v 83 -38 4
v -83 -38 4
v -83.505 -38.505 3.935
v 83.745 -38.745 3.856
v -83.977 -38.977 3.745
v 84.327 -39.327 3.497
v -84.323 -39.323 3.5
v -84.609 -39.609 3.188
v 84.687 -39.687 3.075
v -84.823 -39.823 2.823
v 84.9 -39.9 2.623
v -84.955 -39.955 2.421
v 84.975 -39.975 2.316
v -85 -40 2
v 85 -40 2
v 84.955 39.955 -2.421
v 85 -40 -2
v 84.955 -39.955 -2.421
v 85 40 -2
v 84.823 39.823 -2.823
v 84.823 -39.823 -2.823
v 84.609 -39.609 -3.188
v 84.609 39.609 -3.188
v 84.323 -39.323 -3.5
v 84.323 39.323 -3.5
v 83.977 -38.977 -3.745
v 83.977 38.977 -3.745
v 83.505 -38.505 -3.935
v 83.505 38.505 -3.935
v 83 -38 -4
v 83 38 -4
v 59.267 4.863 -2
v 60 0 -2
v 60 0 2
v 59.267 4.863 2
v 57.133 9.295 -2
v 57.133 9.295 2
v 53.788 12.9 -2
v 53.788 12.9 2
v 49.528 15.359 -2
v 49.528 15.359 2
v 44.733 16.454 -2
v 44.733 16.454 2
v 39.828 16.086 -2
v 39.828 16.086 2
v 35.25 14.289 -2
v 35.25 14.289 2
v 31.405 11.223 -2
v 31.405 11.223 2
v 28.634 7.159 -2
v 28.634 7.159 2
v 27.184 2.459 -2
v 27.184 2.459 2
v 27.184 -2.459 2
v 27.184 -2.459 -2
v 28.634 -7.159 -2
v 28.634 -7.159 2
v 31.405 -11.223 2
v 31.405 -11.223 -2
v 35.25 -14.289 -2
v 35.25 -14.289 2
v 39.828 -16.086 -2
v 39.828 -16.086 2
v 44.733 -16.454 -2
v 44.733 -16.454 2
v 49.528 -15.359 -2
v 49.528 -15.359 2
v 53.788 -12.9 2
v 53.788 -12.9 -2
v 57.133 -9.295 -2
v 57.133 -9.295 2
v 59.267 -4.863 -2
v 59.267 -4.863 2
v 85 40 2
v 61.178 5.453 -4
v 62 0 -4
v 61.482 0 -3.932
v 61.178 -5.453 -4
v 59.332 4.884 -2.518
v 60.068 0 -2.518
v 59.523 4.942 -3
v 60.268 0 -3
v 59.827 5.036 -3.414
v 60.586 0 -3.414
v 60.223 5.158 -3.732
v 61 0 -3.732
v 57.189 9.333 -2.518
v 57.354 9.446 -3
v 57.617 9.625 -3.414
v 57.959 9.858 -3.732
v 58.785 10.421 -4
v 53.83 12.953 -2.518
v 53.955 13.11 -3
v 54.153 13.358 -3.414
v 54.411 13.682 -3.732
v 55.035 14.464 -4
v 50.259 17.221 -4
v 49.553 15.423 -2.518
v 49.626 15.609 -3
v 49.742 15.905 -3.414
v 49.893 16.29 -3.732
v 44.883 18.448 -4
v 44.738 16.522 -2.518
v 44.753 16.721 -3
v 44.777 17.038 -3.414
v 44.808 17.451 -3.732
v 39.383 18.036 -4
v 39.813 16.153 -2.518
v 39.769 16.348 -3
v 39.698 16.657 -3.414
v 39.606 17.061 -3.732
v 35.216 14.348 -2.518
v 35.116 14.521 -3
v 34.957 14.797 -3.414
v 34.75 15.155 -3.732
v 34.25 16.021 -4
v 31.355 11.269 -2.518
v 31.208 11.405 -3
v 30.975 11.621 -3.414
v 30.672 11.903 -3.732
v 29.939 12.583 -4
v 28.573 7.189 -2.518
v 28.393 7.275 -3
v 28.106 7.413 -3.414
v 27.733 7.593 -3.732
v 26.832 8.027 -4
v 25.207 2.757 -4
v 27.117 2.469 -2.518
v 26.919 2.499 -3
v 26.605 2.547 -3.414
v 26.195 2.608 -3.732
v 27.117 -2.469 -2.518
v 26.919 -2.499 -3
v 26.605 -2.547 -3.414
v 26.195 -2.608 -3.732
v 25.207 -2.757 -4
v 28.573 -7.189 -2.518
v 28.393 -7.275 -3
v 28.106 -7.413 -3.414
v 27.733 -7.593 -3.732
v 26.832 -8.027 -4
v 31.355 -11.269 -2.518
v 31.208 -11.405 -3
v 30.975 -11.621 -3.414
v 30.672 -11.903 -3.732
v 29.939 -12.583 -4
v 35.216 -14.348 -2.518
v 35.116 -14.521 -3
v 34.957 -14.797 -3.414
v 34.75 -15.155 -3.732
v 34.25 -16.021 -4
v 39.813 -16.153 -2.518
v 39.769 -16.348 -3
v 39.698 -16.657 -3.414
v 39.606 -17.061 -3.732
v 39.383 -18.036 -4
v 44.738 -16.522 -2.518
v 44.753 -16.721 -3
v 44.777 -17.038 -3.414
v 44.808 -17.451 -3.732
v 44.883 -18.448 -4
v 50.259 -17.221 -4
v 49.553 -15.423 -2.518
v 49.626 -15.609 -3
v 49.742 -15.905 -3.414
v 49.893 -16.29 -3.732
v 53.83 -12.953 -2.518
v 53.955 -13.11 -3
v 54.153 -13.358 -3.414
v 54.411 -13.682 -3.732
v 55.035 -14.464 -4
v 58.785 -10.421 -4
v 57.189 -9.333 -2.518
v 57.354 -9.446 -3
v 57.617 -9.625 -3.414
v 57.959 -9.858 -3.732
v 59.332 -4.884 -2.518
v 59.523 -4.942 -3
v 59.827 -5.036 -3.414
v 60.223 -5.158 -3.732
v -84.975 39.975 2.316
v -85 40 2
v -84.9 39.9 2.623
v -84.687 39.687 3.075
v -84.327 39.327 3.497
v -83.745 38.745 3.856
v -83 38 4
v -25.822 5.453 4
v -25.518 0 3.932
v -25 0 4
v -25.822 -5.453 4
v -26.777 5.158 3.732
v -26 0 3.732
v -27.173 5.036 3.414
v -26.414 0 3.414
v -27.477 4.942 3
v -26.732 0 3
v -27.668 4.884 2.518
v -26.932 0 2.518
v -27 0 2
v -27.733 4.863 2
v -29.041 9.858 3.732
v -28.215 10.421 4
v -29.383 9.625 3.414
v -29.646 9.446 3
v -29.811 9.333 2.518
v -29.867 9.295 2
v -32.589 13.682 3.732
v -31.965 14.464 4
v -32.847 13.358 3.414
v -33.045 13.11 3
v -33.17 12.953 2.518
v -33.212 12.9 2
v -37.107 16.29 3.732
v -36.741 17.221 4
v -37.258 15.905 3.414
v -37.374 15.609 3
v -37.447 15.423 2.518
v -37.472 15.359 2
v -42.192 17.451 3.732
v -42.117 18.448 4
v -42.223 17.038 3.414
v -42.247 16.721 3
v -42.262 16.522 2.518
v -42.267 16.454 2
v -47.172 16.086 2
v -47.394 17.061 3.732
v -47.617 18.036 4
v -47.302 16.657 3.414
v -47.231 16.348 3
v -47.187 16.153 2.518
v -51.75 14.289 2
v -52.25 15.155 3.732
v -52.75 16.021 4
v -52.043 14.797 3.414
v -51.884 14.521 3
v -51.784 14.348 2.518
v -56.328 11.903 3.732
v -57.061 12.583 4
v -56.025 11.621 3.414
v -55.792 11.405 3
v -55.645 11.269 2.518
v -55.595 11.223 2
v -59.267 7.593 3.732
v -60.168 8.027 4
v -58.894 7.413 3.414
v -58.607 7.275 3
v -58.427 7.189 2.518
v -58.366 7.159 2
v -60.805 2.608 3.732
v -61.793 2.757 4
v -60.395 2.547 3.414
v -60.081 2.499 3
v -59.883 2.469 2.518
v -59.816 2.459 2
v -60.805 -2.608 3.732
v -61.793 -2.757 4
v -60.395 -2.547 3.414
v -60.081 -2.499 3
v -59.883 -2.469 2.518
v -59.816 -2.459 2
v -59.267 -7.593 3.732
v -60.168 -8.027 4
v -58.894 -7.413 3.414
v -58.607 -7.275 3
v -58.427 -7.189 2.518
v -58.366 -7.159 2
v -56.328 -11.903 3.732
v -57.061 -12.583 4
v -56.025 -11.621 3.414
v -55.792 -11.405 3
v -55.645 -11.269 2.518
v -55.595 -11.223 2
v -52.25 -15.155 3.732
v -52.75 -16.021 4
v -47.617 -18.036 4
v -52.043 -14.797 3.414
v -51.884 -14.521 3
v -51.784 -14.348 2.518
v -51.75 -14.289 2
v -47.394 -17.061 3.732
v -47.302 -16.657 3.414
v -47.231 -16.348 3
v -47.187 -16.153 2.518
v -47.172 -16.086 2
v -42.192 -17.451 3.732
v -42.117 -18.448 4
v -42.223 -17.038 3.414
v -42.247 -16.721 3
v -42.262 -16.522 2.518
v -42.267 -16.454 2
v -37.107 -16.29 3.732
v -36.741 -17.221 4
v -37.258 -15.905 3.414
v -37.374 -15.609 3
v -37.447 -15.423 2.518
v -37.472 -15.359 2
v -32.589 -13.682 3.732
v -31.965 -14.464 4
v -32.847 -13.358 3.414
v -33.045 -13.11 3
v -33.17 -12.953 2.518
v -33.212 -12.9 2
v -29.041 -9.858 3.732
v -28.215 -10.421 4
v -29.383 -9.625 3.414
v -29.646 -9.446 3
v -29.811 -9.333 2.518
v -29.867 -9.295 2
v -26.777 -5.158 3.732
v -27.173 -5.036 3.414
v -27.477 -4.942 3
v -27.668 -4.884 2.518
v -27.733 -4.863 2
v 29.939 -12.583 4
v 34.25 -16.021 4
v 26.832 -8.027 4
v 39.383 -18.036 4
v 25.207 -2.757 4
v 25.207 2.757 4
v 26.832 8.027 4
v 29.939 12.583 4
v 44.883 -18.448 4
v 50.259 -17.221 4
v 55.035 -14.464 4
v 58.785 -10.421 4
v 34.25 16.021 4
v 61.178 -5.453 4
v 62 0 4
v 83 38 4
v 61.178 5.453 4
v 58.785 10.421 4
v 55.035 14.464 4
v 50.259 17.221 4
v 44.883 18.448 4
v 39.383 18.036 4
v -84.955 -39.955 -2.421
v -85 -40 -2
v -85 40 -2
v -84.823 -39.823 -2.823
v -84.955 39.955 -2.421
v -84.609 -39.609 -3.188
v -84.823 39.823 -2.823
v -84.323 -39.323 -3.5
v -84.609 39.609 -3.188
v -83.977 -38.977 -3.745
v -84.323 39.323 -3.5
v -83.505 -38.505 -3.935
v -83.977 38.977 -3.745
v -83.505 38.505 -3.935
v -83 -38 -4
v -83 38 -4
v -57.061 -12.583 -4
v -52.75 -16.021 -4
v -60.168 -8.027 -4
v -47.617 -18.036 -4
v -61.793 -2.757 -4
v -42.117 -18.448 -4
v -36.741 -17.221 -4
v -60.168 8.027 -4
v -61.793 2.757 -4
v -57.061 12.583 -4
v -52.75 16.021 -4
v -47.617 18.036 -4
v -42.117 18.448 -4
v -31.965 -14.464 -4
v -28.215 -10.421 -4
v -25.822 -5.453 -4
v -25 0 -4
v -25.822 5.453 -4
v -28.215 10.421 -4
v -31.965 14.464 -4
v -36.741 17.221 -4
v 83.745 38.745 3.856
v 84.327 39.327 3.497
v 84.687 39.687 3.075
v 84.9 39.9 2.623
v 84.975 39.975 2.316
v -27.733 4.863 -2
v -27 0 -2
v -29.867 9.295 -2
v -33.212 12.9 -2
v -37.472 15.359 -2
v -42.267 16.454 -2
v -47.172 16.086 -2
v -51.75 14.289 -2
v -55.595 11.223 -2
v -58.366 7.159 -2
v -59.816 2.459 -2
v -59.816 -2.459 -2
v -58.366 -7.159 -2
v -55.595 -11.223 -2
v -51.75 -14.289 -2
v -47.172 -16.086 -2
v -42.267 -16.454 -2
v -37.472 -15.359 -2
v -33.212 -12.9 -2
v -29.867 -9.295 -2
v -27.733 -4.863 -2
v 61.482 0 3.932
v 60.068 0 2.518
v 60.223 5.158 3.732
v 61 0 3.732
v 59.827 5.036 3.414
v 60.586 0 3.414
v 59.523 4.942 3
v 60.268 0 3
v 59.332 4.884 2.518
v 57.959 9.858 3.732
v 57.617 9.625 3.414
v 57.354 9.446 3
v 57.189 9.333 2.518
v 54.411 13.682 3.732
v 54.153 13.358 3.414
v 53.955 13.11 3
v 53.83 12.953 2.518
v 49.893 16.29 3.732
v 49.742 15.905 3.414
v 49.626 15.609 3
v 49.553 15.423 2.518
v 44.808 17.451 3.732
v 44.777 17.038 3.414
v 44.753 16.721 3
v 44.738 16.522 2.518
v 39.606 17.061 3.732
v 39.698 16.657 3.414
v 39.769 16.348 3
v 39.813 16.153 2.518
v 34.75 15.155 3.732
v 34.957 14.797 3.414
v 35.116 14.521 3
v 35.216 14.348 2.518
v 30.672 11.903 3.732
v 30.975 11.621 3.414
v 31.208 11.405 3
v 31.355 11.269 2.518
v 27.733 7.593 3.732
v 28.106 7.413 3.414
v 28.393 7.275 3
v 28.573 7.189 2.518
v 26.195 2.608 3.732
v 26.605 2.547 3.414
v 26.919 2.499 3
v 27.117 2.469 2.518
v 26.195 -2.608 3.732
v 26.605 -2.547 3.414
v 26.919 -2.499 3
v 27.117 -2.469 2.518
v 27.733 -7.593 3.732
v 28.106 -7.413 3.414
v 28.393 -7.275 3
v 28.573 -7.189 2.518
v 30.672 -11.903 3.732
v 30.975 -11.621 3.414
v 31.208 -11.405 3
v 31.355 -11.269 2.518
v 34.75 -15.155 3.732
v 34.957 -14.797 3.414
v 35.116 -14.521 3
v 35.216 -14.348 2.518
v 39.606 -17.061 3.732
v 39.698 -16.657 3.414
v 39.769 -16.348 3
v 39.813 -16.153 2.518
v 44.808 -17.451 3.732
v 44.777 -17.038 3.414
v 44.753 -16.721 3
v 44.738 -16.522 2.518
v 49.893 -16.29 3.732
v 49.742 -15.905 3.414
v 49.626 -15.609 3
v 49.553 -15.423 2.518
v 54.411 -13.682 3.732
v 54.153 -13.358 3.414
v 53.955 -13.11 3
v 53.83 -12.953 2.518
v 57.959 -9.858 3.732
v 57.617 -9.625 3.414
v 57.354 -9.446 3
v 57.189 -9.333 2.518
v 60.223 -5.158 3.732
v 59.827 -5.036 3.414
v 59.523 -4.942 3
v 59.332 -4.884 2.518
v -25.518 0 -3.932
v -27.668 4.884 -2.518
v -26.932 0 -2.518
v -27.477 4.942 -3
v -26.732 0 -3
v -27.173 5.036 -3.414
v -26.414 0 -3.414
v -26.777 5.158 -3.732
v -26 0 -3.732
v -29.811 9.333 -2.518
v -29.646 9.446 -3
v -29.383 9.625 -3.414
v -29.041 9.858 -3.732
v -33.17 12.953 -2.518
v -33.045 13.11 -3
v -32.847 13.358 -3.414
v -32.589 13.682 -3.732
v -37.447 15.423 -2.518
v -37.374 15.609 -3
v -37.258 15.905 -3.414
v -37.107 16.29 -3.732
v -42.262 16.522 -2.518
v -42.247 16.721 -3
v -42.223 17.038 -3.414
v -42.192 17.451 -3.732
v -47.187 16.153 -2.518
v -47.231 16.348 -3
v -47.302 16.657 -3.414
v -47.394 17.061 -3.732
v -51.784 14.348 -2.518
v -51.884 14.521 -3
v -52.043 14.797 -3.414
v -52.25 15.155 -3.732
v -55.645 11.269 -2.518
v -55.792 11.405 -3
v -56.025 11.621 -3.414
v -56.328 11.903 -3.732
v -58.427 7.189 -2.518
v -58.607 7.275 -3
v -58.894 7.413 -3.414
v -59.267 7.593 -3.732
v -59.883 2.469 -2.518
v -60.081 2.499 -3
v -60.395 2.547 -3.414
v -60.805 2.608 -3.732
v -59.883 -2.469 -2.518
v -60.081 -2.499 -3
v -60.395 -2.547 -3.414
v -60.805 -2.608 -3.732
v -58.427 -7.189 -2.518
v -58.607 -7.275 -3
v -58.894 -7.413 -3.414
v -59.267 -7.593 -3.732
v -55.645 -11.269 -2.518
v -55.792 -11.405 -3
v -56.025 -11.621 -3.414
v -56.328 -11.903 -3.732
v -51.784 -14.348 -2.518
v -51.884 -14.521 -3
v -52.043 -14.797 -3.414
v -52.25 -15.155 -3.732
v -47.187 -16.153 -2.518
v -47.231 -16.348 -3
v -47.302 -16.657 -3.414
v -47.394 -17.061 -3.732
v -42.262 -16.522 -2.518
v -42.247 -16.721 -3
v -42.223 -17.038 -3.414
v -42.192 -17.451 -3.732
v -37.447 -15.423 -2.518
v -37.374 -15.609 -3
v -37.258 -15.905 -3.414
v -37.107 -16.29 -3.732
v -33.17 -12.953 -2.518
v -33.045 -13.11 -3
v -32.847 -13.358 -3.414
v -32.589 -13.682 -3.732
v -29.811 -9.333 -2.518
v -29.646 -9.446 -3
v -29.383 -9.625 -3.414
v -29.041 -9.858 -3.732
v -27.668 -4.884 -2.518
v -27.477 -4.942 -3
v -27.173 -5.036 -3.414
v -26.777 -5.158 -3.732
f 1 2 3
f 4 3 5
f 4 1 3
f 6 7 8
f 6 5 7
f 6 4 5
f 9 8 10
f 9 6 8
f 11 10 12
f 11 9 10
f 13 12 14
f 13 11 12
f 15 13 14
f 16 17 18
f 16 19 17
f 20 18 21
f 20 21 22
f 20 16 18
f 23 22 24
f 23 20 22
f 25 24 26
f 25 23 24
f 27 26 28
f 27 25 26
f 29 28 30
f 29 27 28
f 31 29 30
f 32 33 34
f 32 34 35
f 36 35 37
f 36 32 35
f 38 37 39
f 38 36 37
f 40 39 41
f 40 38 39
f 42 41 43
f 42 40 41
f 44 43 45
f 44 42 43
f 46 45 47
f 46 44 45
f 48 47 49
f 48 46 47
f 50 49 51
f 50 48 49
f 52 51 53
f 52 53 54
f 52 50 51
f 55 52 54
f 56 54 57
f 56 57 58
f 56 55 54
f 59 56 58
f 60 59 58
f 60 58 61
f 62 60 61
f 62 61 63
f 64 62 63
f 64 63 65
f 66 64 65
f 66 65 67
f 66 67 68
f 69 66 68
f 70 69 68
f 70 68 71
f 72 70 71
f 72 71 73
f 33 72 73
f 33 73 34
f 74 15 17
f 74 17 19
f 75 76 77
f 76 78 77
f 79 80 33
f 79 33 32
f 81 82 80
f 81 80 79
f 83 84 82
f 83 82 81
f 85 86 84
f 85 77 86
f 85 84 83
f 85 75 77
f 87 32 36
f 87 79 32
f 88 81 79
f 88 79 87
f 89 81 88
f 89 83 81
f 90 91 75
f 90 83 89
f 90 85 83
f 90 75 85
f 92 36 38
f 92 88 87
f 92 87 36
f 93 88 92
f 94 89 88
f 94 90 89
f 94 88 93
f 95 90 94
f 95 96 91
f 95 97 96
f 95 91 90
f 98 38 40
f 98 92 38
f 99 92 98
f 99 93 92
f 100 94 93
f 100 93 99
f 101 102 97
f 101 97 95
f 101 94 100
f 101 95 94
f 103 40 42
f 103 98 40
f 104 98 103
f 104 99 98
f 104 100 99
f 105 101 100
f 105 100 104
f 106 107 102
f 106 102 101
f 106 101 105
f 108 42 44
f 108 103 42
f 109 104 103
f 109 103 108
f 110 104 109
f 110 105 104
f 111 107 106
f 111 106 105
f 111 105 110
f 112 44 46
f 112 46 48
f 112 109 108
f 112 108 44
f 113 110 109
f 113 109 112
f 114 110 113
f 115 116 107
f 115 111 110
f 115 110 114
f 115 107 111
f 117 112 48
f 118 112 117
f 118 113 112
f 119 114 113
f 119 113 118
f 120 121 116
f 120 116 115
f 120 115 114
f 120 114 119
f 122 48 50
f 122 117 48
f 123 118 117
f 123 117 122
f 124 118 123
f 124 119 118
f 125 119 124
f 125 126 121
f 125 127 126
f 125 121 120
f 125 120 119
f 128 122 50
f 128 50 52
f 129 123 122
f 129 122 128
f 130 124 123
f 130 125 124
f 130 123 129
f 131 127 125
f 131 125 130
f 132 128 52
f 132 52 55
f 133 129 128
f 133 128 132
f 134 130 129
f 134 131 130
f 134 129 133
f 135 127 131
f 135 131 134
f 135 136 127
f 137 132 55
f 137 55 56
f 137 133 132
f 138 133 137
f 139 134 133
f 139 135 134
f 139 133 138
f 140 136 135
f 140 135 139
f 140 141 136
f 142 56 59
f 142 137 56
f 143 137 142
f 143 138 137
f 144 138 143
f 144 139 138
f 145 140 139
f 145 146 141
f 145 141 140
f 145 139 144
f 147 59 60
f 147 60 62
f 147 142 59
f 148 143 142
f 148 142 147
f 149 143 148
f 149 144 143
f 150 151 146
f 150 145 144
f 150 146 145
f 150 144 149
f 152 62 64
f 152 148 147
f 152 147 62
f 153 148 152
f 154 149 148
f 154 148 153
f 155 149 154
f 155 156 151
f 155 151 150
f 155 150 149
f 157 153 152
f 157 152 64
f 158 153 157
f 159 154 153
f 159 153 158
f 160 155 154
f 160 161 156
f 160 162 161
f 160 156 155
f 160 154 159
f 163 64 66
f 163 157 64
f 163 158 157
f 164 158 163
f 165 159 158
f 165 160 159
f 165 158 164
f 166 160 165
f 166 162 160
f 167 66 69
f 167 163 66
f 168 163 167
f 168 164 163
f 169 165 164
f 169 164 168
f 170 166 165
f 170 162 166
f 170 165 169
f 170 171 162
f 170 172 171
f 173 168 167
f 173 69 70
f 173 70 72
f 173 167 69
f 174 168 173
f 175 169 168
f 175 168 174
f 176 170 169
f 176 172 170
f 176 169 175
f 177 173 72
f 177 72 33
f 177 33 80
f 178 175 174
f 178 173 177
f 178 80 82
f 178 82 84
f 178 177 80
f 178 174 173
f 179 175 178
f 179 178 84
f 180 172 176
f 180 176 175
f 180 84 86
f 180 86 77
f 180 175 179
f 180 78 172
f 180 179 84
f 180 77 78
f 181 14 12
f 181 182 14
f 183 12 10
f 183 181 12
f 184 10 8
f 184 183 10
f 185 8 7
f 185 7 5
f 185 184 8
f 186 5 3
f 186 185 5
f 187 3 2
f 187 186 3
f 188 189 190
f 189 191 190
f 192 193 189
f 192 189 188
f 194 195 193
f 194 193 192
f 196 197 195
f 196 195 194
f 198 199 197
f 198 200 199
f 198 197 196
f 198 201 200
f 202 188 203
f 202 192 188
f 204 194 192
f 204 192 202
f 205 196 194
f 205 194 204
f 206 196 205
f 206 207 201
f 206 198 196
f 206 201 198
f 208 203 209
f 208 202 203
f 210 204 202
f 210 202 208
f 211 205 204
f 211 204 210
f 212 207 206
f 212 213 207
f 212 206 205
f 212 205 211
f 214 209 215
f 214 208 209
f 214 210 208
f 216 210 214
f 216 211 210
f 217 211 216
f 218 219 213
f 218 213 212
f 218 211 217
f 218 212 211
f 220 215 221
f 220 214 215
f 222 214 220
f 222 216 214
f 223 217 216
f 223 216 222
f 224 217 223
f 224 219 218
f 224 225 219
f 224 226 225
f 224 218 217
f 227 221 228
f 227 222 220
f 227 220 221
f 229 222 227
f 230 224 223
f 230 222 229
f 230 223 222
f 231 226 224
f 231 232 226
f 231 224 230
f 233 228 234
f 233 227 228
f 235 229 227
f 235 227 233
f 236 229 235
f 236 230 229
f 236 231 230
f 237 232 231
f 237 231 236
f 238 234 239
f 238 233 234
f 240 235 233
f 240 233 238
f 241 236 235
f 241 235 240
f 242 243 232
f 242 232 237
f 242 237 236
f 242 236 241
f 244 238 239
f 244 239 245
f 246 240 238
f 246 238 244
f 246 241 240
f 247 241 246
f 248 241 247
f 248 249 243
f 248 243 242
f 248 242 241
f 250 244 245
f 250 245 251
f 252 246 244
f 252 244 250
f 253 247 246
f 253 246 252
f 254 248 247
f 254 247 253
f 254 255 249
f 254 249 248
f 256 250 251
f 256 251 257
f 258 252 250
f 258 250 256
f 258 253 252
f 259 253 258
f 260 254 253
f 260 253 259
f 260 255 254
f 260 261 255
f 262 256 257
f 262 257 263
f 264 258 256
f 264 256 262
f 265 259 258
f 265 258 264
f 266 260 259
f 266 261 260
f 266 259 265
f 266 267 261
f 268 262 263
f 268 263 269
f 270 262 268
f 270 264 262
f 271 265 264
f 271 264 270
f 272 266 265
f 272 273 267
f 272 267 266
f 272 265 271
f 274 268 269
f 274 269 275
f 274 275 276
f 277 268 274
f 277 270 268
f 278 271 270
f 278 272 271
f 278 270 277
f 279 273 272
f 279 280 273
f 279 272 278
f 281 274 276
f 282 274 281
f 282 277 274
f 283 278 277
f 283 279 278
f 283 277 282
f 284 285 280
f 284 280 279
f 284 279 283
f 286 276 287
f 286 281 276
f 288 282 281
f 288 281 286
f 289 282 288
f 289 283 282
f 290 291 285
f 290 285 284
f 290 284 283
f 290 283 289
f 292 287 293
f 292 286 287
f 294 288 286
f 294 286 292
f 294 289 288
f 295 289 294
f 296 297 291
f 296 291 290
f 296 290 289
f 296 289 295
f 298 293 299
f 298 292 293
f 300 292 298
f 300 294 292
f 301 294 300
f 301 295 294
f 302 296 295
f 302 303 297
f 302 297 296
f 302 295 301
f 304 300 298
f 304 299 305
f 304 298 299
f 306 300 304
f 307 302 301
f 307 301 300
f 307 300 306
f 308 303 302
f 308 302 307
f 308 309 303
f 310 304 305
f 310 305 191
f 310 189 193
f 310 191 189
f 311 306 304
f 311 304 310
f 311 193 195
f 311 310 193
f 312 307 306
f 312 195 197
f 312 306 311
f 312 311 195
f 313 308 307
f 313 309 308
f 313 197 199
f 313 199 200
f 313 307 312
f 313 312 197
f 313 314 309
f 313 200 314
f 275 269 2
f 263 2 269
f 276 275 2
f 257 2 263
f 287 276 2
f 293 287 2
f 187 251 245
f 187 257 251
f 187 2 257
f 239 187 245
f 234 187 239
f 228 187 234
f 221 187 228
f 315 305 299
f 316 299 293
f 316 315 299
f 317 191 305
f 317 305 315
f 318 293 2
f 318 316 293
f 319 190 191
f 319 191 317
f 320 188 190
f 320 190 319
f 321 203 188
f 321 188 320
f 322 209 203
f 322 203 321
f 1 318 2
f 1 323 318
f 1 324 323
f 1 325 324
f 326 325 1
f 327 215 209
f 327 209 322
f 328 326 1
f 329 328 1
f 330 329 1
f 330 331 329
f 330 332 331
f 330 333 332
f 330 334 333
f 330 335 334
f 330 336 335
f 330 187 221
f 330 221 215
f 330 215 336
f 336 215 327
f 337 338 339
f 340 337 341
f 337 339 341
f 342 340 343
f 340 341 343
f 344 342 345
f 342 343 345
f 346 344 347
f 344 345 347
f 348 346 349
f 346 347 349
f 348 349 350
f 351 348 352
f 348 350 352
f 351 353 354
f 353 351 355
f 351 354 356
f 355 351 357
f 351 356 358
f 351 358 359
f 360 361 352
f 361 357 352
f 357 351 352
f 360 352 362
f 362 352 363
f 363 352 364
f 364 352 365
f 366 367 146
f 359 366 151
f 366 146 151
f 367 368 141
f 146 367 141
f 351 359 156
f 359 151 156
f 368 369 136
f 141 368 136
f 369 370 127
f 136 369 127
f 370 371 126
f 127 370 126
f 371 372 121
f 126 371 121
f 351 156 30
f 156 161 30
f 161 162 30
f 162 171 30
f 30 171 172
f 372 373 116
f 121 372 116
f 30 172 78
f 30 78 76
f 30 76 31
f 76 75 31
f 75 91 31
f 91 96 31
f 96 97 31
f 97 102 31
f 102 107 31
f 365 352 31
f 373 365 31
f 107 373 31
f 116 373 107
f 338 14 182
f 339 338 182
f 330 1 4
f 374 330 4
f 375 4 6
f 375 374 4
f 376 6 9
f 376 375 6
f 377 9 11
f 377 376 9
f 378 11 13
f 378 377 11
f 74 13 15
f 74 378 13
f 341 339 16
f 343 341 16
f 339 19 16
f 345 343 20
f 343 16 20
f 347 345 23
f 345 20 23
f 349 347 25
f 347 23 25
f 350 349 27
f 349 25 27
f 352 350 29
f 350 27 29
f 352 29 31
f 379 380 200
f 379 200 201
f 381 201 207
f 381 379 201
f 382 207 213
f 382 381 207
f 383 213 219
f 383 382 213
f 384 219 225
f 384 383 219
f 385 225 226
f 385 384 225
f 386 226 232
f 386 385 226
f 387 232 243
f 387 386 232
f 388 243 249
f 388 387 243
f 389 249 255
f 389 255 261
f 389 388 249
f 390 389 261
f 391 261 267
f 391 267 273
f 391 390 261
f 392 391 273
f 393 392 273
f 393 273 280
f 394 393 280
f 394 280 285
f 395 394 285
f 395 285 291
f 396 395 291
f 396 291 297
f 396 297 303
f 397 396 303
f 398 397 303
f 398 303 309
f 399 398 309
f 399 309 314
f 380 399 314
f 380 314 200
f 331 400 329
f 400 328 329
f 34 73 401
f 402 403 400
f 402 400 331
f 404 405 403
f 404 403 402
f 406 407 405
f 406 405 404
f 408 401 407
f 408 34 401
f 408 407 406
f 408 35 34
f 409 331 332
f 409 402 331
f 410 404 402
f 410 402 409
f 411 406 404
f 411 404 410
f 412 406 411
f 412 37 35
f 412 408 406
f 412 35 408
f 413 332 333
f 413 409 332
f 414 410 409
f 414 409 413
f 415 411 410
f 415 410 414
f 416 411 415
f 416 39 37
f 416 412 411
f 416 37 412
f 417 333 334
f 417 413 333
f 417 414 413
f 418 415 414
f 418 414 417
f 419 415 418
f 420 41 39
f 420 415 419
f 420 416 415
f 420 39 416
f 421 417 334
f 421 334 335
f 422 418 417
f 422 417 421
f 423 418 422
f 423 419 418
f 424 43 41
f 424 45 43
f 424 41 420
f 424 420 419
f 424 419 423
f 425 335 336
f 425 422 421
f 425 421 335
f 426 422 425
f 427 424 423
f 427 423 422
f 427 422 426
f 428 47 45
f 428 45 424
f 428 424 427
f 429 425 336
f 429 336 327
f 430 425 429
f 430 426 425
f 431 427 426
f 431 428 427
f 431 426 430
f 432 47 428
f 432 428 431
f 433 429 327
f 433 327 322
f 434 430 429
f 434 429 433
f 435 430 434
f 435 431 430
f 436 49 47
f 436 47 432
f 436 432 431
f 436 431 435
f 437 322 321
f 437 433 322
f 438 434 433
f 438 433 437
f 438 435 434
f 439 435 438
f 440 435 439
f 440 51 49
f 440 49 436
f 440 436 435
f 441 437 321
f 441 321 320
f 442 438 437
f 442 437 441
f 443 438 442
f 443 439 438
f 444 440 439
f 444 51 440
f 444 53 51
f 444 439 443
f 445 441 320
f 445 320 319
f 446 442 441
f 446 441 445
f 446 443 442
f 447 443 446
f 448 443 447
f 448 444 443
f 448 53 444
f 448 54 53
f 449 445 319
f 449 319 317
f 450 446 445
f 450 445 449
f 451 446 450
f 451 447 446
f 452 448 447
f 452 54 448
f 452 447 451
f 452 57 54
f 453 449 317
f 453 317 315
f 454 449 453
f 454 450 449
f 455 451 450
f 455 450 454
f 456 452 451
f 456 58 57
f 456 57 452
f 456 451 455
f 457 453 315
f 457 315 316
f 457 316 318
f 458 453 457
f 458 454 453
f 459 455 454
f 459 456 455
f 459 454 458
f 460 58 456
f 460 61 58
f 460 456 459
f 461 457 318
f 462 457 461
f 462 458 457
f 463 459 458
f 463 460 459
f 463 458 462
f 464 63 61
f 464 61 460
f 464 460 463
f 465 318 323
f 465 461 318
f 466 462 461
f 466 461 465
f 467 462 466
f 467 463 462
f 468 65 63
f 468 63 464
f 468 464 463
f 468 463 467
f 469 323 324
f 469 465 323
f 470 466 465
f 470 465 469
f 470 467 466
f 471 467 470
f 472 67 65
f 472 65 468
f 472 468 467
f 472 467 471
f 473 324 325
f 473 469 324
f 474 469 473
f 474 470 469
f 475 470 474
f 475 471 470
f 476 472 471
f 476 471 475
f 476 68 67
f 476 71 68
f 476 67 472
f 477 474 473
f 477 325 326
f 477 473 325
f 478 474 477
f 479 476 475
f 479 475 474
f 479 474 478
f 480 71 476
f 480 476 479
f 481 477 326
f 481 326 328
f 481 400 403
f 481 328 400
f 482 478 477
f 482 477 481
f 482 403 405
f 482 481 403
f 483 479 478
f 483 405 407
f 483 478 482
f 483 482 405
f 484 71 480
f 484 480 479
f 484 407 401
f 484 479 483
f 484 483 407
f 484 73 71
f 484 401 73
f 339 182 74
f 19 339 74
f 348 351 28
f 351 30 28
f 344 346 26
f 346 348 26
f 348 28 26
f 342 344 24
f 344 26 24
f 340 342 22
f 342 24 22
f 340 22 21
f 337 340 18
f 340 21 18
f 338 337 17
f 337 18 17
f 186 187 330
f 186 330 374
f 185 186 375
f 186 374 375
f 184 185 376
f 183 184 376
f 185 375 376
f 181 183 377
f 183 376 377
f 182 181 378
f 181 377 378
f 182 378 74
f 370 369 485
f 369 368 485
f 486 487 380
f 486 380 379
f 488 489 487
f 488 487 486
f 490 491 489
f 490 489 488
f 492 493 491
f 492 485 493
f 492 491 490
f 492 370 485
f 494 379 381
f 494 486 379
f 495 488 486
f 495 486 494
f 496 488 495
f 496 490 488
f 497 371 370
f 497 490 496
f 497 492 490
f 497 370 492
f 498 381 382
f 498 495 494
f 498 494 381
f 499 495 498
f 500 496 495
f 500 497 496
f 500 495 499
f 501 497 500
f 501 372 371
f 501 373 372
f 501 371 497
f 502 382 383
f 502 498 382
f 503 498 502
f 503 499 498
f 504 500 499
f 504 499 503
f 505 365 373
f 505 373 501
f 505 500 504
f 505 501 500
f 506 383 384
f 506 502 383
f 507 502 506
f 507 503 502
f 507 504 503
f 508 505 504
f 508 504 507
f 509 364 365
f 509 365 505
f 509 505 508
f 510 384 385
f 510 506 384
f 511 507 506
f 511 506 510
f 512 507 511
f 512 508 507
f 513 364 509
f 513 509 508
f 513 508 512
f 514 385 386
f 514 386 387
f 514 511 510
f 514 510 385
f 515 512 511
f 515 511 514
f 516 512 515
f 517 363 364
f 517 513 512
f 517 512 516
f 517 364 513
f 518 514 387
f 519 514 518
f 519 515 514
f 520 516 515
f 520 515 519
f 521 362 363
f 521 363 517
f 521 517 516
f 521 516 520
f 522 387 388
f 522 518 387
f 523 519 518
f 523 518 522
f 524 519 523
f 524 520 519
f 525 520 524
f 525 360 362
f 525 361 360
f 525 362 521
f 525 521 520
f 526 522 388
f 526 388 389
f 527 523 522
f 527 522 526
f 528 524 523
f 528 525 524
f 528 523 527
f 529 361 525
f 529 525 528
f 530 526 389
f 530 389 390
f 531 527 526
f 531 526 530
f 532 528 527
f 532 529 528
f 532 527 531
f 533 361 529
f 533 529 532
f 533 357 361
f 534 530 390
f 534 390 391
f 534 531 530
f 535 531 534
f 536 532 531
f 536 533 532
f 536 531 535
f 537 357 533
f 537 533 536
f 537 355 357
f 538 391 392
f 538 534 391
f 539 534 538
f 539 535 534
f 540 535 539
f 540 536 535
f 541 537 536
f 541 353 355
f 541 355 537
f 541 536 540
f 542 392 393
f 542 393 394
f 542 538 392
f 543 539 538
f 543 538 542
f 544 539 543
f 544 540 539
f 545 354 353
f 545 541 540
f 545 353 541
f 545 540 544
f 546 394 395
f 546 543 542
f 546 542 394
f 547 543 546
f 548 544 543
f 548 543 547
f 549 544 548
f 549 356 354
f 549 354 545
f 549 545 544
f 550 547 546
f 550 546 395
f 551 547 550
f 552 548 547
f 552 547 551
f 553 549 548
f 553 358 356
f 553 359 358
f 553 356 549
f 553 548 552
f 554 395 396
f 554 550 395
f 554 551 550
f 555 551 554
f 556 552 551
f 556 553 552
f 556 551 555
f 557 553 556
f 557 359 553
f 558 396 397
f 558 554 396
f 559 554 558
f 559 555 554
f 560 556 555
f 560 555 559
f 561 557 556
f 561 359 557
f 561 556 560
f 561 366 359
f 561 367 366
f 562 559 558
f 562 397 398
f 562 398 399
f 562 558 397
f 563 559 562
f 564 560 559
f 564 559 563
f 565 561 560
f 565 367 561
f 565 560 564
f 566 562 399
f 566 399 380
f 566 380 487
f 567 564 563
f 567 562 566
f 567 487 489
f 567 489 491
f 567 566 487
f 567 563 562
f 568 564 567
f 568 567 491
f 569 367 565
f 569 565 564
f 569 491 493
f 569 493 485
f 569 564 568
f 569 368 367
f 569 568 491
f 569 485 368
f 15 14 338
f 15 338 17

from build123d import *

# Parameters (mm, degrees)
F0_W     = 170
F0_H     = 80
F0_R     = 16.5
F1_DEPTH = 4
F2_R     = 2


with BuildPart() as f1:
    # F0 (on Top) → F1 (new body, symmetric)
    with BuildSketch(Plane.XY):
        Rectangle(F0_W, F0_H)
        with Locations((-43.5, 0)):
            Circle(F0_R, mode=Mode.SUBTRACT)
        with Locations((43.5, 0)):
            Circle(F0_R, mode=Mode.SUBTRACT)
    extrude(amount=F1_DEPTH, both=True)

    # F2
    f2_edges = [f1.edges().sort_by_distance(p)[0] for p in [
        (85, 0, -4),
        (0, 40, -4),
        (-85, 0, -4),
        (0, -40, -4),
        (-60, 0, -4),
        (27, 0, -4),
        (85, 0, 4),
        (0, 40, 4),
        (-85, 0, 4),
        (0, -40, 4),
        (-60, 0, 4),
        (27, 0, 4),
    ]]
    fillet(f2_edges, radius=F2_R)


solid = f1.part
